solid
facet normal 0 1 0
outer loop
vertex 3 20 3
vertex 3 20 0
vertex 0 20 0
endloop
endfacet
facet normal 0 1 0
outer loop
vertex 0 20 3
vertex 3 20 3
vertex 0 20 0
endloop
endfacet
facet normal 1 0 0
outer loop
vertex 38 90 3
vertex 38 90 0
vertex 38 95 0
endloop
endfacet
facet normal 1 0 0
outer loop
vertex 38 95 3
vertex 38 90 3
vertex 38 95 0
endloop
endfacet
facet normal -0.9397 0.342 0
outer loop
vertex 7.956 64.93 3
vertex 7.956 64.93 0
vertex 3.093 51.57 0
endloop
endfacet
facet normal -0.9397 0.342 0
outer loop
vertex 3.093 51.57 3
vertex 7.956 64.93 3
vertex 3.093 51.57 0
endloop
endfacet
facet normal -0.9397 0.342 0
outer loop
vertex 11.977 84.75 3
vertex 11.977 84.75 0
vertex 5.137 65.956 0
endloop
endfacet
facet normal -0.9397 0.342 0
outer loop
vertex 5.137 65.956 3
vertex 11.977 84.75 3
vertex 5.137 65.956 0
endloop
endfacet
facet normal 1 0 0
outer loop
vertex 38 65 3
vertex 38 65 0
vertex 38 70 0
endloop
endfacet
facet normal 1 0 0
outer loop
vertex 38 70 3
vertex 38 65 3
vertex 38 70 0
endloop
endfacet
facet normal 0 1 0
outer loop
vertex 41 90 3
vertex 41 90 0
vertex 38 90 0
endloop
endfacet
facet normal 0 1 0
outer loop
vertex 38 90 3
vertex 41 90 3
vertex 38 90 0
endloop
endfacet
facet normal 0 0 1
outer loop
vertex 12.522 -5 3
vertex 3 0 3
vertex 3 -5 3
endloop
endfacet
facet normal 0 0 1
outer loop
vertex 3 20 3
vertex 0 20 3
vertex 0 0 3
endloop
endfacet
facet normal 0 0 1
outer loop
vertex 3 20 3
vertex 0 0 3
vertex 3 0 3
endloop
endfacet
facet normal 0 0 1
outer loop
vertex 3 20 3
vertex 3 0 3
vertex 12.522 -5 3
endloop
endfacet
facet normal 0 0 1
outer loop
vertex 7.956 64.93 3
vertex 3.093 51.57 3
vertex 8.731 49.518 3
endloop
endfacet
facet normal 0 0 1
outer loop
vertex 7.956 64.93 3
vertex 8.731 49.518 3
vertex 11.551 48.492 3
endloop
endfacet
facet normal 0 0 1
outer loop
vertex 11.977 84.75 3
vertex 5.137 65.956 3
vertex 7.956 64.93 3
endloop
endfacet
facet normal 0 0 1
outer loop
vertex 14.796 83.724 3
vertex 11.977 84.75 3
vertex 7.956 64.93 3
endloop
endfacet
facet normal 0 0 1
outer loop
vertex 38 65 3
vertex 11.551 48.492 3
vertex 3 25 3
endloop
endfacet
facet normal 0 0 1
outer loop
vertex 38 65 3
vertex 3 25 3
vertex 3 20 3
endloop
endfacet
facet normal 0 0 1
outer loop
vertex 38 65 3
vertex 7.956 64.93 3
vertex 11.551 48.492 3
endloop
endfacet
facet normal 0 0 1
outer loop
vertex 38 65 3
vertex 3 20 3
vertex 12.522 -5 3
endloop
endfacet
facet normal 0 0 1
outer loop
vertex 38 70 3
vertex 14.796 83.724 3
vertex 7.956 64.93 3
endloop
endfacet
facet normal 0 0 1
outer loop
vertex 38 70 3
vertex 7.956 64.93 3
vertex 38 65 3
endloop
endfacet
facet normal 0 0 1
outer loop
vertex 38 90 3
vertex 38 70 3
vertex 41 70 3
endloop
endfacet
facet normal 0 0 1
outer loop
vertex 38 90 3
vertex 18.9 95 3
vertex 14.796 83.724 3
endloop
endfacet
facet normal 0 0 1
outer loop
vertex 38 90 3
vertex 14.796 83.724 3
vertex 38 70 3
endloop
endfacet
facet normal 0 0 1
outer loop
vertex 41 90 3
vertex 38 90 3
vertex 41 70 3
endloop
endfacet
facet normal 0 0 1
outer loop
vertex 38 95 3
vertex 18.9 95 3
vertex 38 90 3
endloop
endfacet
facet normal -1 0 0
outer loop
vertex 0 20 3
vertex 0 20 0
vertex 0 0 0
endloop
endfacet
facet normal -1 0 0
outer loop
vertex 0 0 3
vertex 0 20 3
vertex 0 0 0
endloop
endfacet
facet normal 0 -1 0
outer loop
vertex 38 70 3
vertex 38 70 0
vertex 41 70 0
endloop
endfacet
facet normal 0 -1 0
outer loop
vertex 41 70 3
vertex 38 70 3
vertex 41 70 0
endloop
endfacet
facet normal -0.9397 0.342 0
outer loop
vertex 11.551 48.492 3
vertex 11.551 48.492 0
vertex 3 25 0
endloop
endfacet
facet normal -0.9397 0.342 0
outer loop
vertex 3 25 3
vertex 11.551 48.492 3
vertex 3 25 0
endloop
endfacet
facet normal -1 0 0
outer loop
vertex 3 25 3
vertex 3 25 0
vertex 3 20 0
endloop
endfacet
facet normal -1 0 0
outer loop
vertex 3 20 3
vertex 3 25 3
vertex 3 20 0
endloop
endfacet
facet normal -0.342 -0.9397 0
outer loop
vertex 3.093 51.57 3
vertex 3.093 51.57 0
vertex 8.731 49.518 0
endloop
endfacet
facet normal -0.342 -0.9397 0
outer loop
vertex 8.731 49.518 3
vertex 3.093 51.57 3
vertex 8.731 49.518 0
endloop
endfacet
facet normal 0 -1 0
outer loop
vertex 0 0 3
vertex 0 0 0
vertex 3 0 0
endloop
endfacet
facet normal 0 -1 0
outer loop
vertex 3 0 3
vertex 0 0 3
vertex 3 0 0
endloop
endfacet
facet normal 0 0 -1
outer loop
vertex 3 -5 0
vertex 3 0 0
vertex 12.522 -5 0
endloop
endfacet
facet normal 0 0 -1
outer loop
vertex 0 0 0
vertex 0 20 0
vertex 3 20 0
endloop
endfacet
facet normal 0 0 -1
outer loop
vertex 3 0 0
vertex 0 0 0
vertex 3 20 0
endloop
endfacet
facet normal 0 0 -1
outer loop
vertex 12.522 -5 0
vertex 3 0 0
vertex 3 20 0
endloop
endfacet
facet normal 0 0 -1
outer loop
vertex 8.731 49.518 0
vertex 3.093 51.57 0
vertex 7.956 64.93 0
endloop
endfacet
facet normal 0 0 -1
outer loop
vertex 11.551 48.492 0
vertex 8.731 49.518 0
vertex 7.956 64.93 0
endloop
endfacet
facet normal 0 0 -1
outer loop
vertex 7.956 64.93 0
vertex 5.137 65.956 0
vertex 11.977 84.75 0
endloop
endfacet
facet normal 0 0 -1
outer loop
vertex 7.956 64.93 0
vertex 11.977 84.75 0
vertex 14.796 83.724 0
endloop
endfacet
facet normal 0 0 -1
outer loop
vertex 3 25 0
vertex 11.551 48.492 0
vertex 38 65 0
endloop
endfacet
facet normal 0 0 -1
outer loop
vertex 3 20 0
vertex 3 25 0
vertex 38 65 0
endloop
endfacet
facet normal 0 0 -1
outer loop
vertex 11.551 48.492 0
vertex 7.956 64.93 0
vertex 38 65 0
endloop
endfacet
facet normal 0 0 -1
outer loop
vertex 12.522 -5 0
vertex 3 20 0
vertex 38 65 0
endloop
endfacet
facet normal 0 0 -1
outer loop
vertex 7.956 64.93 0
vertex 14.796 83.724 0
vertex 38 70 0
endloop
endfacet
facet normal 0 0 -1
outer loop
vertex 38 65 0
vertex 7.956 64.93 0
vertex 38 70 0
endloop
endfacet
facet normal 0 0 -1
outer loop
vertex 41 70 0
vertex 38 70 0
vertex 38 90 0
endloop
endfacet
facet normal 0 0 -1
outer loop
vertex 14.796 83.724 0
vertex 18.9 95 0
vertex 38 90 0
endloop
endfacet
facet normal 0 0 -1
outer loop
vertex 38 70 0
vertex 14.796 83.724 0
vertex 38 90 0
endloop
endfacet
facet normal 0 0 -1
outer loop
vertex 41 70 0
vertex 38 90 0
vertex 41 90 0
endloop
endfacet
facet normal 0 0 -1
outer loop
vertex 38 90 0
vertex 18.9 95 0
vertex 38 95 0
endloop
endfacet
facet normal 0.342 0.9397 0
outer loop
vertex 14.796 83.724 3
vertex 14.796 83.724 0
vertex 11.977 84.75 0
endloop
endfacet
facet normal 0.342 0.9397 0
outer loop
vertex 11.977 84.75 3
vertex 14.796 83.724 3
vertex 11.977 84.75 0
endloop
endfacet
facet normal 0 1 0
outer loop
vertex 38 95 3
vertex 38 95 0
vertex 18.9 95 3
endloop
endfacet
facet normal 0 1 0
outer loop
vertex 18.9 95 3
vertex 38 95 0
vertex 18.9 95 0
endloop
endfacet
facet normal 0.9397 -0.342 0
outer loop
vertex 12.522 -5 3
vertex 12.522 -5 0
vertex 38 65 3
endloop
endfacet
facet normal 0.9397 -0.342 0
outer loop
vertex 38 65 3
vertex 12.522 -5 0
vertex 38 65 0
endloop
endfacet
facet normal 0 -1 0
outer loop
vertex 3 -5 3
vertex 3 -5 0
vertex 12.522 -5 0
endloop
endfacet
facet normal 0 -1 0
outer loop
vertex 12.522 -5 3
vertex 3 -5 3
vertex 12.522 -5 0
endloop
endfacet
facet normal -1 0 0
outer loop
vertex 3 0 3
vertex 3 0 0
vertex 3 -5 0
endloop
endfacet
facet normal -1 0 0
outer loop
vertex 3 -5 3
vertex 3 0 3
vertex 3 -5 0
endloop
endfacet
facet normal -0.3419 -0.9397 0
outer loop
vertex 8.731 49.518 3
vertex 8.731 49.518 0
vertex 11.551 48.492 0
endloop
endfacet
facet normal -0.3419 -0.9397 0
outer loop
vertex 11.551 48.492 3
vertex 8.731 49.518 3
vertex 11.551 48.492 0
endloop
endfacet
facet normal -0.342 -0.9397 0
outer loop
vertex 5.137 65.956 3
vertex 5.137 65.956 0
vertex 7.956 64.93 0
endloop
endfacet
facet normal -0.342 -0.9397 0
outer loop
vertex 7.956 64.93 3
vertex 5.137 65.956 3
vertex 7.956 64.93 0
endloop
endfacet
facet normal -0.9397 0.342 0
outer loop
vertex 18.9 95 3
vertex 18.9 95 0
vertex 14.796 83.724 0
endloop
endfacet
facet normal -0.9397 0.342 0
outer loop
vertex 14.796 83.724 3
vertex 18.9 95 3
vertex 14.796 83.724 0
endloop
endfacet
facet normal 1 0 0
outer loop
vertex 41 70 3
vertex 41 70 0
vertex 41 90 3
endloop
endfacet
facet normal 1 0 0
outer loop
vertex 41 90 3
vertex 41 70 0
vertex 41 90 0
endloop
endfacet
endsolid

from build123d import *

# Parameters (mm, degrees)
BOSS_EXTRUDE1_DEPTH = 3
BOSS_EXTRUDE2_DEPTH = 3


with BuildPart() as part:
    # Sketch1 → Boss-Extrude1 (new body)
    with BuildSketch(Plane.XY):
        Polygon((3, -5), (12.522083602, -5), (38.000000001, 65), (38.000000001, 70), (41, 70), (41, 89.999999997), (38.000000001, 89.999999997), (38.000000001, 94.999999997), (28.477916397, 94.999999997), (18.390906449, 67.286167933), (15.571828589, 68.312228362), (8.731425723, 49.518375949), (11.550503583, 48.49231552), (3, 25), (3, 20), (0, 20), (0, 0), (3, 0), align=None)
    extrude(amount=BOSS_EXTRUDE1_DEPTH)

    # Sketch2 → Boss-Extrude2 (add)
    with BuildSketch(Plane(origin=(0, 0, 0), x_dir=(-1, 0, 0), z_dir=(0, 0, -1))):
        Polygon((-7.955671859, 64.929836131), (-3.093269996, 51.57049681), (-8.731425723, 49.518375949), (-15.571828589, 68.312228362), (-18.390906449, 67.286167933), (-28.477916397, 94.999999997), (-18.900316445, 94.999999997), (-14.796074725, 83.723688547), (-11.976996863, 84.749748977), (-5.136593996, 65.955896561), align=None)
    extrude(amount=-BOSS_EXTRUDE2_DEPTH)


solid = part.part
